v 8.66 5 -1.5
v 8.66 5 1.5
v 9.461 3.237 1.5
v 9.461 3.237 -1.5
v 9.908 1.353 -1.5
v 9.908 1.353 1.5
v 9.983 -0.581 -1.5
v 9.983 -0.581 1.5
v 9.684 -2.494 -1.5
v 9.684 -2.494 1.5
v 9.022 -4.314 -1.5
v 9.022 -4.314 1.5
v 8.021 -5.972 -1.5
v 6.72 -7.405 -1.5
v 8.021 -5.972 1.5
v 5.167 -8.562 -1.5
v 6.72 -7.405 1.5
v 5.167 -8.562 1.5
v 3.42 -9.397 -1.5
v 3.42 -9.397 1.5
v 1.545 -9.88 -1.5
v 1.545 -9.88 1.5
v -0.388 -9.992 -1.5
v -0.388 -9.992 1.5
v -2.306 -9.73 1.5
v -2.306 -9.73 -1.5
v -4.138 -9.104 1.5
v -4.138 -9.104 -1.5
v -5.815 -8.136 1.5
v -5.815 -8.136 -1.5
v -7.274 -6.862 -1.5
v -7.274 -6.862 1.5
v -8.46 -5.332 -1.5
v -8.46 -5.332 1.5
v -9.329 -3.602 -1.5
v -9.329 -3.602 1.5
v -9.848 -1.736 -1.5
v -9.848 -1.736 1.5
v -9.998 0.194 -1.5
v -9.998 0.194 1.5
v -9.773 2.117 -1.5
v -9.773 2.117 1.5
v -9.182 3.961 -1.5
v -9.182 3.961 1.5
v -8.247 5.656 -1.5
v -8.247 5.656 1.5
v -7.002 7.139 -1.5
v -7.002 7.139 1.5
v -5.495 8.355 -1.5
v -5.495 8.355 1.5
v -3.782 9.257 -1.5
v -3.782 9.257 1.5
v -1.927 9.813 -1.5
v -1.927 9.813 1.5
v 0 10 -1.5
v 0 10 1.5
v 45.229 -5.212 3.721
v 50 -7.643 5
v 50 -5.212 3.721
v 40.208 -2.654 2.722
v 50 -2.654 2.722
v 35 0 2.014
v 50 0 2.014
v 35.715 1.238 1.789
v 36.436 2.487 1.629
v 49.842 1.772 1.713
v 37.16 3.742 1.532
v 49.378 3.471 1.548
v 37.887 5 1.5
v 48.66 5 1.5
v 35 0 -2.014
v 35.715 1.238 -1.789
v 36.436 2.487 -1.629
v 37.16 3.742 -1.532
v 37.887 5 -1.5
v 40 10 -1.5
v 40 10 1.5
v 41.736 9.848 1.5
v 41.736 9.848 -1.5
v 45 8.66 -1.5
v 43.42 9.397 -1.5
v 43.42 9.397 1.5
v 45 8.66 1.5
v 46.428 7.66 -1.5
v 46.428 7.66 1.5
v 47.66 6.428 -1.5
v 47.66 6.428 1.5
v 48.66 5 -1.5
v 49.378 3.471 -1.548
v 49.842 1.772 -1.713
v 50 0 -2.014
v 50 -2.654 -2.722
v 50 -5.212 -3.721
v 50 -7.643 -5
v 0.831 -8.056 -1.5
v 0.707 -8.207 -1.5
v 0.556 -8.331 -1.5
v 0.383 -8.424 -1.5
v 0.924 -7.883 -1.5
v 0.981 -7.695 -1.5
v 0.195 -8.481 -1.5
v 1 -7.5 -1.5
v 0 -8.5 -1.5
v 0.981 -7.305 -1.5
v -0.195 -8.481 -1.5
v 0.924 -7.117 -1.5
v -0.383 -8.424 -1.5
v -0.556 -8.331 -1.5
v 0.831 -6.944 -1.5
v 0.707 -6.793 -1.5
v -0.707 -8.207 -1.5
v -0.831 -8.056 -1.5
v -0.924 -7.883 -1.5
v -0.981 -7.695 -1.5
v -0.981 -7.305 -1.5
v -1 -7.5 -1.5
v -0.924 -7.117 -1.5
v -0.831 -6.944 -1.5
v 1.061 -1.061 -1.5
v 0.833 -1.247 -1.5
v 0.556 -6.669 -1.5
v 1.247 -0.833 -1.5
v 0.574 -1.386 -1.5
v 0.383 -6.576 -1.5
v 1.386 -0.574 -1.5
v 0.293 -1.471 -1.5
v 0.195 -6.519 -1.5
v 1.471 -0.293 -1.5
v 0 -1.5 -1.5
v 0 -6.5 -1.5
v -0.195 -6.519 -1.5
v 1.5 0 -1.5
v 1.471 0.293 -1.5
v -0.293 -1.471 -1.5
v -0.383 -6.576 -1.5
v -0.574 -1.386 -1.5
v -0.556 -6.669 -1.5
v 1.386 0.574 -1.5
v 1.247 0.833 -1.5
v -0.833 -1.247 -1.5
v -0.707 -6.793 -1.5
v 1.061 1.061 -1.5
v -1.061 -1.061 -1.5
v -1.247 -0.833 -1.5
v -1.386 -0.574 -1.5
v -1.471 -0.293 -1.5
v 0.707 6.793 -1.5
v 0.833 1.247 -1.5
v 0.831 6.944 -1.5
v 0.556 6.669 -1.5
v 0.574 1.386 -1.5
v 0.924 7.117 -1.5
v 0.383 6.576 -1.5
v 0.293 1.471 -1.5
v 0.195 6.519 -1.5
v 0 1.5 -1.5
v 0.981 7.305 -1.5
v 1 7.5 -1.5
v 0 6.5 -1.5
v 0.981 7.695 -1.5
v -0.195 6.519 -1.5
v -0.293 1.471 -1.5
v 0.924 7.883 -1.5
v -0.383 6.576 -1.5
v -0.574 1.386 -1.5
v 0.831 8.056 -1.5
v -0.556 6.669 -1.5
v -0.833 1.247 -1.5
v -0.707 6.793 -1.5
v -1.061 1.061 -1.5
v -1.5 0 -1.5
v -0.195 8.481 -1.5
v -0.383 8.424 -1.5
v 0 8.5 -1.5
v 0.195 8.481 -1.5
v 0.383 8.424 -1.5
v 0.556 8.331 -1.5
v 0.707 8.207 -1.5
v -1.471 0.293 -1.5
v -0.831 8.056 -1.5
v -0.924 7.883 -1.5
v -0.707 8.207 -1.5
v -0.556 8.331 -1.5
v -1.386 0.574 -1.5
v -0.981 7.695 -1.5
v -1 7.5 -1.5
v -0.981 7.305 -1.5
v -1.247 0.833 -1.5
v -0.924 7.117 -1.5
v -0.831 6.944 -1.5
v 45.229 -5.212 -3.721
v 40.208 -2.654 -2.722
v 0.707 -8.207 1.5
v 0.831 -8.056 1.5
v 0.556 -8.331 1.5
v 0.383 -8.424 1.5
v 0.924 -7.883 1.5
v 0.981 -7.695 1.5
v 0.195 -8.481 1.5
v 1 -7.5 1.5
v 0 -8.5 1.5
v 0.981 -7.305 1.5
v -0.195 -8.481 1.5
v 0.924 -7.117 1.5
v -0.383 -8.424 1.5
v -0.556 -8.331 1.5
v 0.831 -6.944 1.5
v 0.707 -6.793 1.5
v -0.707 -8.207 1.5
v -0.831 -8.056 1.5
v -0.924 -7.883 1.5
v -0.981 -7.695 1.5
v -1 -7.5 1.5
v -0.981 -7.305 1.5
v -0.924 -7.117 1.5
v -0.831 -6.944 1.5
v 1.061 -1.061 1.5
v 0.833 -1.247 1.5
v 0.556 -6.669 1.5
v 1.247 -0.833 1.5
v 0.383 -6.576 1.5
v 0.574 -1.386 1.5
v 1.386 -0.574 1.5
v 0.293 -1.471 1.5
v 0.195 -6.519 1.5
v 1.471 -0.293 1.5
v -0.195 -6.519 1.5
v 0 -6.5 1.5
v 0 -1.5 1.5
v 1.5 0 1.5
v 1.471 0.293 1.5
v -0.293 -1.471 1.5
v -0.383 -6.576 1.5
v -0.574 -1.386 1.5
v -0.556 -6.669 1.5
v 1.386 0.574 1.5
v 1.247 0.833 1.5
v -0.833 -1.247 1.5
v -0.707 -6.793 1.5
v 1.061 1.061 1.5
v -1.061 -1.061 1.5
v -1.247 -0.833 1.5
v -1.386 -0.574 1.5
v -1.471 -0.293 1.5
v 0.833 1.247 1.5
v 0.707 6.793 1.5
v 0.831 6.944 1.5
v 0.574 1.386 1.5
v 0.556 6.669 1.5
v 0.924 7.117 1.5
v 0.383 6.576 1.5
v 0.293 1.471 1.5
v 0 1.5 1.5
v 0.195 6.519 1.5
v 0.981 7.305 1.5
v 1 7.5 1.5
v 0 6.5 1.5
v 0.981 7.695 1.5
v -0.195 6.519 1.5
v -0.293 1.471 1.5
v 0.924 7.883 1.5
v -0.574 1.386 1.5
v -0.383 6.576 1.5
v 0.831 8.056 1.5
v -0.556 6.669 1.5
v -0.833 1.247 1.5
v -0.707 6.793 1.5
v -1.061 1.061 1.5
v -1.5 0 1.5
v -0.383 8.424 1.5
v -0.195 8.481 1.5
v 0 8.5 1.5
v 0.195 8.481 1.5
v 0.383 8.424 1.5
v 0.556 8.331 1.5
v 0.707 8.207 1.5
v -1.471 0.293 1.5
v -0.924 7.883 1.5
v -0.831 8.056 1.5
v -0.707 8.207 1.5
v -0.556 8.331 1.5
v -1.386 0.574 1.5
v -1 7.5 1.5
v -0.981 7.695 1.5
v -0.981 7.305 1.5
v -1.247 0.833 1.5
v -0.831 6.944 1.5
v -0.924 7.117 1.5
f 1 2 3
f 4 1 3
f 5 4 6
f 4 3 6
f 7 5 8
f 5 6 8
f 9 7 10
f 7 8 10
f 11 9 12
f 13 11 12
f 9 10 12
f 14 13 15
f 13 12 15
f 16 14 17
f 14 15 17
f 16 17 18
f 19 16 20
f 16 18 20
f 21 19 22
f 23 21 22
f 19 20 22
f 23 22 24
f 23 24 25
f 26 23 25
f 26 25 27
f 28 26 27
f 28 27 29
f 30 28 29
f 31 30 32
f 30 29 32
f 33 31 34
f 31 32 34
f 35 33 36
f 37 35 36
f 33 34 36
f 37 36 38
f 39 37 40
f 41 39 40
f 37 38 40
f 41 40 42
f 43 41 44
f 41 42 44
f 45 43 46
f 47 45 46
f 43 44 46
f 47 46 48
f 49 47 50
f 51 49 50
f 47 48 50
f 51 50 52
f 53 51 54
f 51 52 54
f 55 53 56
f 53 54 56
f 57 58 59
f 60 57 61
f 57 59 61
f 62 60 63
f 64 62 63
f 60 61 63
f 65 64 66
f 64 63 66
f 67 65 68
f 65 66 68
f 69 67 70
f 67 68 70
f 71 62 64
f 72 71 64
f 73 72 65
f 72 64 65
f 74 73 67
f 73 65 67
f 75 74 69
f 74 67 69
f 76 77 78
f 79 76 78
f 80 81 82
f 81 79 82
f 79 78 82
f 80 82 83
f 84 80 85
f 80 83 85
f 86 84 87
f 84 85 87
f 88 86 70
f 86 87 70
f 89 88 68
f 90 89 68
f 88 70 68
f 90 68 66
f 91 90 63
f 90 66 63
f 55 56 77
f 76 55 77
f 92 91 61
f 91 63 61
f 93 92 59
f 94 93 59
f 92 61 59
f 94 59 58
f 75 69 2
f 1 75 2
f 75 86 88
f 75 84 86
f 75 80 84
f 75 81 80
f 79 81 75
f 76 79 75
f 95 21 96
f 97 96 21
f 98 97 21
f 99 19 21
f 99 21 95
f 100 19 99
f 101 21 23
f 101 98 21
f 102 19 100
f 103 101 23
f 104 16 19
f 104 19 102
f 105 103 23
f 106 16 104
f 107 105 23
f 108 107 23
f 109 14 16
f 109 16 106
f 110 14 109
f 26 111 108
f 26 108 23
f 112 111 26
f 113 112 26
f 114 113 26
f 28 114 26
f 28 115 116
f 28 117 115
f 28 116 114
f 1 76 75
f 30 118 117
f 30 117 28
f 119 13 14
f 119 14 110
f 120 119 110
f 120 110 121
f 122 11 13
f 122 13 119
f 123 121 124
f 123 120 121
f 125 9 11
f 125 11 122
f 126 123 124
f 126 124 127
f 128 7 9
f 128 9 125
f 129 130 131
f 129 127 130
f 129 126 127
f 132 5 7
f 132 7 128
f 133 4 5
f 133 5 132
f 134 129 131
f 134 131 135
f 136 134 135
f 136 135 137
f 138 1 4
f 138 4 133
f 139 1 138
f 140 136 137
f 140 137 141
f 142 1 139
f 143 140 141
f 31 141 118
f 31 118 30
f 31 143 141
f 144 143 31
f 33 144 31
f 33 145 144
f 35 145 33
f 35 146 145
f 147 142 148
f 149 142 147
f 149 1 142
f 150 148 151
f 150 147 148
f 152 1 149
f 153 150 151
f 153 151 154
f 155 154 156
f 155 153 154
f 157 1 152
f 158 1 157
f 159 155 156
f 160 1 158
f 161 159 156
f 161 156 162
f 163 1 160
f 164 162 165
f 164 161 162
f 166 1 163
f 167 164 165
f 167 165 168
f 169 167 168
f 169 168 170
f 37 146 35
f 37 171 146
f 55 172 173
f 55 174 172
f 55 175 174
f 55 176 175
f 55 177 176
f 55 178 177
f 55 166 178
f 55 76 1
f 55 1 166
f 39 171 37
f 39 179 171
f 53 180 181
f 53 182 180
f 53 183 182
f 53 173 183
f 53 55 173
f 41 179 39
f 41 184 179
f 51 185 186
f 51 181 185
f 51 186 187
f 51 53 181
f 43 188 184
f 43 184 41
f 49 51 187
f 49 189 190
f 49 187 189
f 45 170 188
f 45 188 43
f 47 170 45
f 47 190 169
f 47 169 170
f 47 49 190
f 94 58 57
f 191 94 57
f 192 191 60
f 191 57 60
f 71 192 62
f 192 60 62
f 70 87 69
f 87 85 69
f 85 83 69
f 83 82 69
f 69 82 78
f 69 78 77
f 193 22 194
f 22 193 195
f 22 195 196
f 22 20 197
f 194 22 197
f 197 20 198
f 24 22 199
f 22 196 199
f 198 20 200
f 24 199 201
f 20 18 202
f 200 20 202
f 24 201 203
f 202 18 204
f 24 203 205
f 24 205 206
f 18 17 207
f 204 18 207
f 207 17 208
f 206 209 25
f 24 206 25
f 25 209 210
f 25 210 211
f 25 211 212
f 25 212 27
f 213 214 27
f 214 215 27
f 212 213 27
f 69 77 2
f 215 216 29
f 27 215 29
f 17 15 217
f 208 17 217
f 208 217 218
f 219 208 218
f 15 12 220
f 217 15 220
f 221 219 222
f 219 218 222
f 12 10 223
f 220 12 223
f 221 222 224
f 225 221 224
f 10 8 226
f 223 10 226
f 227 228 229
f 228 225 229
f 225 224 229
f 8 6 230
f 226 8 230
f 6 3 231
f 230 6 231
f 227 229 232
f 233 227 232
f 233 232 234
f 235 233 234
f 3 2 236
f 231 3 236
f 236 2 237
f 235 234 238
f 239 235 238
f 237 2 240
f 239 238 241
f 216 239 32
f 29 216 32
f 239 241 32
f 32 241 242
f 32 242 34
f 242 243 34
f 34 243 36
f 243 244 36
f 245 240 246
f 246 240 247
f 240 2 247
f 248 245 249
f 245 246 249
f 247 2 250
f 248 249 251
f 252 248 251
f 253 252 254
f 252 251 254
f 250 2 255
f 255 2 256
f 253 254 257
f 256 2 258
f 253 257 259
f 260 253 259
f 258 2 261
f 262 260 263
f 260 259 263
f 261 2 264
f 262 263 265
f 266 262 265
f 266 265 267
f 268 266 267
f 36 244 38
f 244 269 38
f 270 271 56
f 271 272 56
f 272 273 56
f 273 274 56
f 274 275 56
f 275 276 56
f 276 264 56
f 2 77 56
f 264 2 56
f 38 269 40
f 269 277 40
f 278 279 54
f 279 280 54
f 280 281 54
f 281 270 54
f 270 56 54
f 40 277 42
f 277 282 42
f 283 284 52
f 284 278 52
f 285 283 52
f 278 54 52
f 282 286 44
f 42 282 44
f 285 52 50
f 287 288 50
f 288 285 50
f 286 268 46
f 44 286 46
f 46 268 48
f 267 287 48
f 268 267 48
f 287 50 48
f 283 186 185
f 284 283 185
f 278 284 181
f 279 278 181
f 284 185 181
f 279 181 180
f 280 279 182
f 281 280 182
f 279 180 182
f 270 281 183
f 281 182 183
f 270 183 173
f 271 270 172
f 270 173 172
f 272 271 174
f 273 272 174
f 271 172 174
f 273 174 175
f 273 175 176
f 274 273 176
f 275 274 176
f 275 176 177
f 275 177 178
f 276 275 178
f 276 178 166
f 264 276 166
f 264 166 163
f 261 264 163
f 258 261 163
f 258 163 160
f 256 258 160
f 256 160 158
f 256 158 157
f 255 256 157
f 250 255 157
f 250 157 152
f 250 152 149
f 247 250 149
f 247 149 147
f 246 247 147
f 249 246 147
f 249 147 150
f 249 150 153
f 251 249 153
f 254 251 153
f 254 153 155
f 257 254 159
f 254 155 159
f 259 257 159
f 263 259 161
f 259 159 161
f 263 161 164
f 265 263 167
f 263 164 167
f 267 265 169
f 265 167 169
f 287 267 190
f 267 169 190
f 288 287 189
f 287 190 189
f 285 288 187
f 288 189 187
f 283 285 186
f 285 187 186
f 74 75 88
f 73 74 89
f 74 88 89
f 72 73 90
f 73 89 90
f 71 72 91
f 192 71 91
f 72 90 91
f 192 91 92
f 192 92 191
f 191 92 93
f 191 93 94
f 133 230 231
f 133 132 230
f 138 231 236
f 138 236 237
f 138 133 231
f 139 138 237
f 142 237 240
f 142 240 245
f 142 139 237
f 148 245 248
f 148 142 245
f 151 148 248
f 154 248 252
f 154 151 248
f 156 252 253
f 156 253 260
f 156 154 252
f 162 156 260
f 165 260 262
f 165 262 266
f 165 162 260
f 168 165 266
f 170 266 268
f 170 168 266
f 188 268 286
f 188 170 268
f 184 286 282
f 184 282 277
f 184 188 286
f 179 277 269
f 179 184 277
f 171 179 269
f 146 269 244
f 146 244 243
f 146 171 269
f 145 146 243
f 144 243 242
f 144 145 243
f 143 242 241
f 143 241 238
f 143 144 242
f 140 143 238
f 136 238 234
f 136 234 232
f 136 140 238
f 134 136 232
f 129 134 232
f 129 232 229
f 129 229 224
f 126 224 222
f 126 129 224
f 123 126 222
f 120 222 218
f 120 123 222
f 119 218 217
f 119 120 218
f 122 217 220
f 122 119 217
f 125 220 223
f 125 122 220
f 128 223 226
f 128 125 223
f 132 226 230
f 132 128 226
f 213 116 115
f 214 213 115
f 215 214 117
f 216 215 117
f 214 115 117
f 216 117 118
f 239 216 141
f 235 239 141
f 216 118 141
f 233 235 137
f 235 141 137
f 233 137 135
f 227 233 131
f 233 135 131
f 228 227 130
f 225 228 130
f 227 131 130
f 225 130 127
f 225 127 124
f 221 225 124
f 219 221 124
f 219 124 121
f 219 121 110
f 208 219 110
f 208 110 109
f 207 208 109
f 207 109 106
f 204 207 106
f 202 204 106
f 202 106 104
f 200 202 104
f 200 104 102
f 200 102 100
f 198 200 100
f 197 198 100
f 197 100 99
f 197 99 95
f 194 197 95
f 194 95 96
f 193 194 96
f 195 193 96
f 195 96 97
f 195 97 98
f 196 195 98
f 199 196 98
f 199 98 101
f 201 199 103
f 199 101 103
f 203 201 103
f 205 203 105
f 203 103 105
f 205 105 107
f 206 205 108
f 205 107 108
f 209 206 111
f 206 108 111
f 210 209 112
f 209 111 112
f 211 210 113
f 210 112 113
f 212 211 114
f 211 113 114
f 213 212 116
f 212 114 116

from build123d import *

# Parameters (mm, degrees)
SKETCH1_R           = 1.5
BOSS_EXTRUDE1_DEPTH = 1.5
BOSS_EXTRUDE2_DEPTH = 5
CUT_EXTRUDE1_START  = -12.113249
SKETCH3_OUTSIDE_W   = 24.806
SKETCH3_OUTSIDE_H   = 34.806
CUT_EXTRUDE1_DEPTH  = 15
SKETCH4_R           = 1
CUT_EXTRUDE2_DEPTH  = 52.402821


with BuildPart() as part:
    # Sketch1 → Boss-Extrude1 (new, symmetric)
    with BuildSketch(Plane.XY):
        with BuildLine():
            Line((0, 10), (40, 10))
            ThreePointArc((40, 10), (47.071068, 7.071068), (50, 0))
            Line((50, 0), (35, 0))
            Line((35, 0), (37.886751, 5))
            Line((37.886751, 5), (8.660254, 5))
            ThreePointArc((8.660254, 5), (-5, -8.660254), (0, 10))
        make_face()
        Circle(SKETCH1_R, mode=Mode.SUBTRACT)
    extrude(amount=BOSS_EXTRUDE1_DEPTH, both=True)

    # Sketch2 → Boss-Extrude2 (add, symmetric)
    with BuildSketch(Plane.XY):
        with BuildLine():
            Line((37.886751, 5), (37.886751, 10))
            Line((37.886751, 10), (40, 10))
            ThreePointArc((40, 10), (47.071068, 7.071068), (50, 0))
            Line((50, 0), (50, -7.642882))
            Line((50, -7.642882), (35, 0))
            Line((35, 0), (37.886751, 5))
        make_face()
    extrude(amount=BOSS_EXTRUDE2_DEPTH, both=True)

    # Sketch3 outside → Cut-Extrude1 (cut)
    with BuildSketch(Plane.ZY.offset(-37.886751).offset(CUT_EXTRUDE1_START)):
        Rectangle(SKETCH3_OUTSIDE_W, SKETCH3_OUTSIDE_H)
        with BuildLine():
            Line((-1.5, 10), (-1.5, 5))
            ThreePointArc((-1.5, 5), (-2.391151, -1.559201), (-5, -7.642882))
            Line((-5, -7.642882), (5, -7.642882))
            ThreePointArc((5, -7.642882), (2.391151, -1.559201), (1.5, 5))
            Line((1.5, 5), (1.5, 10))
            Line((1.5, 10), (-1.5, 10))
        make_face(mode=Mode.SUBTRACT)
    extrude(amount=CUT_EXTRUDE1_DEPTH, mode=Mode.SUBTRACT)

    # Sketch4 → Cut-Extrude2 (cut, through all)
    with BuildSketch(Plane(origin=(0, 0, -1.5), x_dir=(-1, 0, 0), z_dir=(0, 0, -1))):
        with Locations((0, 7.5)):
            Circle(SKETCH4_R)
        with Locations((0, -7.5)):
            Circle(SKETCH4_R)
    extrude(amount=-CUT_EXTRUDE2_DEPTH, mode=Mode.SUBTRACT)


solid = part.part
